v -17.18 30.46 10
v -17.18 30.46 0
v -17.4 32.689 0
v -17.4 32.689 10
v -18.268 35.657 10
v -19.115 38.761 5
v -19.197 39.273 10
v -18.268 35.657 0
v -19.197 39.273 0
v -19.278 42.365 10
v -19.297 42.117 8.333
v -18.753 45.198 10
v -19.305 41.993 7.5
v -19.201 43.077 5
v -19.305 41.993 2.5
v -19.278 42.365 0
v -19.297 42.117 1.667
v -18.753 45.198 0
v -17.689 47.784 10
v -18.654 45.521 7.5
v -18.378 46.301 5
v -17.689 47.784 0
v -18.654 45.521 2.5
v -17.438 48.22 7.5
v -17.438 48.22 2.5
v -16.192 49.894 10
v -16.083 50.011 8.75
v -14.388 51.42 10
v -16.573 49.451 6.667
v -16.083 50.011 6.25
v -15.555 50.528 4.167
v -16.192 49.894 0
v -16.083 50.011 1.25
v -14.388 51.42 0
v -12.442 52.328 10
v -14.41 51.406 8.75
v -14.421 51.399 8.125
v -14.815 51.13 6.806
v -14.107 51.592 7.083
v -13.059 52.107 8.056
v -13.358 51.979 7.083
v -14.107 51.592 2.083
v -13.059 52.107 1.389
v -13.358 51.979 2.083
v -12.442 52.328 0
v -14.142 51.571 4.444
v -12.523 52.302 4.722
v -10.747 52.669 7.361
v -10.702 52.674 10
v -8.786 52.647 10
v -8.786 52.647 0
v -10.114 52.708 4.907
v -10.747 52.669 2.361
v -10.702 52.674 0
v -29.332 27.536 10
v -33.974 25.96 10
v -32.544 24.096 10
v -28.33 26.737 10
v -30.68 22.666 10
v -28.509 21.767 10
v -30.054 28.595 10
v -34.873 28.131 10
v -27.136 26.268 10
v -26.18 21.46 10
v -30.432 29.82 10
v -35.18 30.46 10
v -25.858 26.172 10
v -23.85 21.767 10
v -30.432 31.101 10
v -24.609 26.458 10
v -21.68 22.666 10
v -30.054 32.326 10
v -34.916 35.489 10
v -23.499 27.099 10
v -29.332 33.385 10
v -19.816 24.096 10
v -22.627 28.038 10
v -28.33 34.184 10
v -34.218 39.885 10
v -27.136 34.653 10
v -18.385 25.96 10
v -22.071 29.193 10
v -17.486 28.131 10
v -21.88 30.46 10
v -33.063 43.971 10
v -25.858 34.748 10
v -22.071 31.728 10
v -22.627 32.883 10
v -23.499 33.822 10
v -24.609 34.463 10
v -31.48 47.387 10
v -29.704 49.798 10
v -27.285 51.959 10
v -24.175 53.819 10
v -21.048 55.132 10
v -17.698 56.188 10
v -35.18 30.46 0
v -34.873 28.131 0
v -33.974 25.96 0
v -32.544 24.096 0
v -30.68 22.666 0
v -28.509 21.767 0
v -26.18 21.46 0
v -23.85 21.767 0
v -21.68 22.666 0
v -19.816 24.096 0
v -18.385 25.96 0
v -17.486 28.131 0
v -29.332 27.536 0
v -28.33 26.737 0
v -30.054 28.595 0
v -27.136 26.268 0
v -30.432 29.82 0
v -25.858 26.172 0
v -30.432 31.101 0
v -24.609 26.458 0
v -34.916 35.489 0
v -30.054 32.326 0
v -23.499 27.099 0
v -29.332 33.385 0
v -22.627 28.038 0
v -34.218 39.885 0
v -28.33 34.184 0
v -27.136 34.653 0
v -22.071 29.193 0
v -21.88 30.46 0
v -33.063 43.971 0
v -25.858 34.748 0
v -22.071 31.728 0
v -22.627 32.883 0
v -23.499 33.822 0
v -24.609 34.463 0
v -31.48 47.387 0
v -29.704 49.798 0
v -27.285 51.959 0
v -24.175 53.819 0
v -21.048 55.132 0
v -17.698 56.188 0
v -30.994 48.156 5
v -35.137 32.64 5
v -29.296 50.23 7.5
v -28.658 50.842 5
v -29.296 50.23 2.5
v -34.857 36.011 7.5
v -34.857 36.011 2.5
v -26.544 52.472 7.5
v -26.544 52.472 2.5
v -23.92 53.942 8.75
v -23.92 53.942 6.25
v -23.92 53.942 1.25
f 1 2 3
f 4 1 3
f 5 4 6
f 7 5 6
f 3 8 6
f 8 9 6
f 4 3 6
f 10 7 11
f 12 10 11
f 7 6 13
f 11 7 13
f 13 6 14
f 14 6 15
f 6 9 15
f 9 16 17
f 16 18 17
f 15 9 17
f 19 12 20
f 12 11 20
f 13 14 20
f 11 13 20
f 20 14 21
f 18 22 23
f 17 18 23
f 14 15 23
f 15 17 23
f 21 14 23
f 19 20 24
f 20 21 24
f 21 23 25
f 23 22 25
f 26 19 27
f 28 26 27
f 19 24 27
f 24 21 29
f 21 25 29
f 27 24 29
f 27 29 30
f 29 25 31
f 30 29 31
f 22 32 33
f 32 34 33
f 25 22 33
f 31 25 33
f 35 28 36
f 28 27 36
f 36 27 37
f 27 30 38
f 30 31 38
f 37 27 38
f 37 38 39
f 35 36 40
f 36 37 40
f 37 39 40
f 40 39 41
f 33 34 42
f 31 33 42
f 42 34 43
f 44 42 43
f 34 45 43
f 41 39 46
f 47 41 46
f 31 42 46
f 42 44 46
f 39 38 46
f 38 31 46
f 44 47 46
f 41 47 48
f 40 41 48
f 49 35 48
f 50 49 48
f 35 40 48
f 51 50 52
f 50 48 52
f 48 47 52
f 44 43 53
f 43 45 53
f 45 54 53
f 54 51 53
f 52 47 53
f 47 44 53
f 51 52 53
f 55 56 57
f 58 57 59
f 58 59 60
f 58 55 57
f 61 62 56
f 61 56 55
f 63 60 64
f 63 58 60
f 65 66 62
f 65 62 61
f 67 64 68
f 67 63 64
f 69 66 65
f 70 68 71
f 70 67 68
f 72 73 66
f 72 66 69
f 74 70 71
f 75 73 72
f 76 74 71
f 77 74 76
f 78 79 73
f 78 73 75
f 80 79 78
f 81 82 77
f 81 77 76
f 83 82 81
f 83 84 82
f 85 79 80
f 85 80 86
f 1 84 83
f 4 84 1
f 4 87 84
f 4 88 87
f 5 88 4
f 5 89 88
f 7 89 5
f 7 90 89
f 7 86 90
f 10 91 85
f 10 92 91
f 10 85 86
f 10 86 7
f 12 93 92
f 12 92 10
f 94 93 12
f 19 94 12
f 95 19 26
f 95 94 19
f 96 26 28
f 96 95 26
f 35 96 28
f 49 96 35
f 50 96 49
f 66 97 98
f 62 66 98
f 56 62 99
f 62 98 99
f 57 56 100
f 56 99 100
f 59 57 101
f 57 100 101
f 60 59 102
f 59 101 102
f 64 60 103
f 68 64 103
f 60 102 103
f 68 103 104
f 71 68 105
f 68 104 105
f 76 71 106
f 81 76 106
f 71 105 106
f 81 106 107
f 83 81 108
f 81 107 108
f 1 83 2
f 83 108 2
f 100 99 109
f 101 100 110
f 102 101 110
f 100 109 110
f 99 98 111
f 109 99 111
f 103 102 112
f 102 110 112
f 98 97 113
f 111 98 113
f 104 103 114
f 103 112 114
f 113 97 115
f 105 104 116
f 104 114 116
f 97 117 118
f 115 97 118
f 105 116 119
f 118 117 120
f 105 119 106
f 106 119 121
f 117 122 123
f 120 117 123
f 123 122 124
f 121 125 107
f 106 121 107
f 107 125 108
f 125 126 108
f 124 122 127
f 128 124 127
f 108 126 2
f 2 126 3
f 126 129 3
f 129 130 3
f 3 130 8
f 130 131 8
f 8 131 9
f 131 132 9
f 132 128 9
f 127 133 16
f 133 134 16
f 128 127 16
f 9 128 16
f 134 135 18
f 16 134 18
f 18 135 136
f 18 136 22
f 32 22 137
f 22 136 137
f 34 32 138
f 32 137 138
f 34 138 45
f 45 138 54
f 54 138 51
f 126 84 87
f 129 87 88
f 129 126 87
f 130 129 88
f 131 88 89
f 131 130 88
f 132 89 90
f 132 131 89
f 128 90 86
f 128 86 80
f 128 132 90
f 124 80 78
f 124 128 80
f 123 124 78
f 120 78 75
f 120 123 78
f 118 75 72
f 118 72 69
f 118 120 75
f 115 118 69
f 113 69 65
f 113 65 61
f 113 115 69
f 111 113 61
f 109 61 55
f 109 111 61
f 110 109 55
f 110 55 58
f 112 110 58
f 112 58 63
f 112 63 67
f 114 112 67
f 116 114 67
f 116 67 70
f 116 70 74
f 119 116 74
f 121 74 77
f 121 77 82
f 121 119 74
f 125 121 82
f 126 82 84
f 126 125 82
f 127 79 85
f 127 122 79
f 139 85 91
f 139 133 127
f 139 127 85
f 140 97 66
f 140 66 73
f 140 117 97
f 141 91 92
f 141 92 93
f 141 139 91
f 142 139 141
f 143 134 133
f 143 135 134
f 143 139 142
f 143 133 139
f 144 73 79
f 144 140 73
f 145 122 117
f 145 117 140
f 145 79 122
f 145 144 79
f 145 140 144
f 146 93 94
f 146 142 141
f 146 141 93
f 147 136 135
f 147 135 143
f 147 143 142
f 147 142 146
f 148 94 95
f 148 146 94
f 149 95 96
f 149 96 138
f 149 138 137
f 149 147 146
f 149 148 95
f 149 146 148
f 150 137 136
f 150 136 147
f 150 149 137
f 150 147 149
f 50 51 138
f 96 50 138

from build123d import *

# Parameters (mm, degrees)
SKETCH1_R           = 4.3
BOSS_EXTRUDE1_DEPTH = 10


with BuildPart() as part:
    # Sketch1 → Boss-Extrude1 (new body)
    with BuildSketch(Plane.XY):
        with BuildLine():
            Line((-8.786321272, 52.647017374), (-17.697634828, 56.188182479))
            add(Edge.make_bspline(
                [(-35.179619379, 30.460455257), (-35.223518874, 33.917669849), (-34.201169153, 49.781165774), (-23.152962073, 54.671871571), (-17.697634828, 56.188182479)],
                knots=[0, 0, 0, 0, 0.555505608, 1, 1, 1, 1], degree=3))
            ThreePointArc((-35.179619379, 30.460455257), (-26.179619379, 21.460455257), (-17.179619379, 30.460455257))
            add(Edge.make_bspline(
                [(-17.179619379, 30.460455257), (-17.07332671, 33.217532109), (-22.036687674, 41.830328863), (-16.393122833, 53.508799667), (-8.786321272, 52.647017374)],
                knots=[0, 0, 0, 0, 0.305227292, 1, 1, 1, 1], degree=3))
        make_face()
        with Locations((-26.179619379, 30.460455257)):
            Circle(SKETCH1_R, mode=Mode.SUBTRACT)
    extrude(amount=BOSS_EXTRUDE1_DEPTH)


solid = part.part
